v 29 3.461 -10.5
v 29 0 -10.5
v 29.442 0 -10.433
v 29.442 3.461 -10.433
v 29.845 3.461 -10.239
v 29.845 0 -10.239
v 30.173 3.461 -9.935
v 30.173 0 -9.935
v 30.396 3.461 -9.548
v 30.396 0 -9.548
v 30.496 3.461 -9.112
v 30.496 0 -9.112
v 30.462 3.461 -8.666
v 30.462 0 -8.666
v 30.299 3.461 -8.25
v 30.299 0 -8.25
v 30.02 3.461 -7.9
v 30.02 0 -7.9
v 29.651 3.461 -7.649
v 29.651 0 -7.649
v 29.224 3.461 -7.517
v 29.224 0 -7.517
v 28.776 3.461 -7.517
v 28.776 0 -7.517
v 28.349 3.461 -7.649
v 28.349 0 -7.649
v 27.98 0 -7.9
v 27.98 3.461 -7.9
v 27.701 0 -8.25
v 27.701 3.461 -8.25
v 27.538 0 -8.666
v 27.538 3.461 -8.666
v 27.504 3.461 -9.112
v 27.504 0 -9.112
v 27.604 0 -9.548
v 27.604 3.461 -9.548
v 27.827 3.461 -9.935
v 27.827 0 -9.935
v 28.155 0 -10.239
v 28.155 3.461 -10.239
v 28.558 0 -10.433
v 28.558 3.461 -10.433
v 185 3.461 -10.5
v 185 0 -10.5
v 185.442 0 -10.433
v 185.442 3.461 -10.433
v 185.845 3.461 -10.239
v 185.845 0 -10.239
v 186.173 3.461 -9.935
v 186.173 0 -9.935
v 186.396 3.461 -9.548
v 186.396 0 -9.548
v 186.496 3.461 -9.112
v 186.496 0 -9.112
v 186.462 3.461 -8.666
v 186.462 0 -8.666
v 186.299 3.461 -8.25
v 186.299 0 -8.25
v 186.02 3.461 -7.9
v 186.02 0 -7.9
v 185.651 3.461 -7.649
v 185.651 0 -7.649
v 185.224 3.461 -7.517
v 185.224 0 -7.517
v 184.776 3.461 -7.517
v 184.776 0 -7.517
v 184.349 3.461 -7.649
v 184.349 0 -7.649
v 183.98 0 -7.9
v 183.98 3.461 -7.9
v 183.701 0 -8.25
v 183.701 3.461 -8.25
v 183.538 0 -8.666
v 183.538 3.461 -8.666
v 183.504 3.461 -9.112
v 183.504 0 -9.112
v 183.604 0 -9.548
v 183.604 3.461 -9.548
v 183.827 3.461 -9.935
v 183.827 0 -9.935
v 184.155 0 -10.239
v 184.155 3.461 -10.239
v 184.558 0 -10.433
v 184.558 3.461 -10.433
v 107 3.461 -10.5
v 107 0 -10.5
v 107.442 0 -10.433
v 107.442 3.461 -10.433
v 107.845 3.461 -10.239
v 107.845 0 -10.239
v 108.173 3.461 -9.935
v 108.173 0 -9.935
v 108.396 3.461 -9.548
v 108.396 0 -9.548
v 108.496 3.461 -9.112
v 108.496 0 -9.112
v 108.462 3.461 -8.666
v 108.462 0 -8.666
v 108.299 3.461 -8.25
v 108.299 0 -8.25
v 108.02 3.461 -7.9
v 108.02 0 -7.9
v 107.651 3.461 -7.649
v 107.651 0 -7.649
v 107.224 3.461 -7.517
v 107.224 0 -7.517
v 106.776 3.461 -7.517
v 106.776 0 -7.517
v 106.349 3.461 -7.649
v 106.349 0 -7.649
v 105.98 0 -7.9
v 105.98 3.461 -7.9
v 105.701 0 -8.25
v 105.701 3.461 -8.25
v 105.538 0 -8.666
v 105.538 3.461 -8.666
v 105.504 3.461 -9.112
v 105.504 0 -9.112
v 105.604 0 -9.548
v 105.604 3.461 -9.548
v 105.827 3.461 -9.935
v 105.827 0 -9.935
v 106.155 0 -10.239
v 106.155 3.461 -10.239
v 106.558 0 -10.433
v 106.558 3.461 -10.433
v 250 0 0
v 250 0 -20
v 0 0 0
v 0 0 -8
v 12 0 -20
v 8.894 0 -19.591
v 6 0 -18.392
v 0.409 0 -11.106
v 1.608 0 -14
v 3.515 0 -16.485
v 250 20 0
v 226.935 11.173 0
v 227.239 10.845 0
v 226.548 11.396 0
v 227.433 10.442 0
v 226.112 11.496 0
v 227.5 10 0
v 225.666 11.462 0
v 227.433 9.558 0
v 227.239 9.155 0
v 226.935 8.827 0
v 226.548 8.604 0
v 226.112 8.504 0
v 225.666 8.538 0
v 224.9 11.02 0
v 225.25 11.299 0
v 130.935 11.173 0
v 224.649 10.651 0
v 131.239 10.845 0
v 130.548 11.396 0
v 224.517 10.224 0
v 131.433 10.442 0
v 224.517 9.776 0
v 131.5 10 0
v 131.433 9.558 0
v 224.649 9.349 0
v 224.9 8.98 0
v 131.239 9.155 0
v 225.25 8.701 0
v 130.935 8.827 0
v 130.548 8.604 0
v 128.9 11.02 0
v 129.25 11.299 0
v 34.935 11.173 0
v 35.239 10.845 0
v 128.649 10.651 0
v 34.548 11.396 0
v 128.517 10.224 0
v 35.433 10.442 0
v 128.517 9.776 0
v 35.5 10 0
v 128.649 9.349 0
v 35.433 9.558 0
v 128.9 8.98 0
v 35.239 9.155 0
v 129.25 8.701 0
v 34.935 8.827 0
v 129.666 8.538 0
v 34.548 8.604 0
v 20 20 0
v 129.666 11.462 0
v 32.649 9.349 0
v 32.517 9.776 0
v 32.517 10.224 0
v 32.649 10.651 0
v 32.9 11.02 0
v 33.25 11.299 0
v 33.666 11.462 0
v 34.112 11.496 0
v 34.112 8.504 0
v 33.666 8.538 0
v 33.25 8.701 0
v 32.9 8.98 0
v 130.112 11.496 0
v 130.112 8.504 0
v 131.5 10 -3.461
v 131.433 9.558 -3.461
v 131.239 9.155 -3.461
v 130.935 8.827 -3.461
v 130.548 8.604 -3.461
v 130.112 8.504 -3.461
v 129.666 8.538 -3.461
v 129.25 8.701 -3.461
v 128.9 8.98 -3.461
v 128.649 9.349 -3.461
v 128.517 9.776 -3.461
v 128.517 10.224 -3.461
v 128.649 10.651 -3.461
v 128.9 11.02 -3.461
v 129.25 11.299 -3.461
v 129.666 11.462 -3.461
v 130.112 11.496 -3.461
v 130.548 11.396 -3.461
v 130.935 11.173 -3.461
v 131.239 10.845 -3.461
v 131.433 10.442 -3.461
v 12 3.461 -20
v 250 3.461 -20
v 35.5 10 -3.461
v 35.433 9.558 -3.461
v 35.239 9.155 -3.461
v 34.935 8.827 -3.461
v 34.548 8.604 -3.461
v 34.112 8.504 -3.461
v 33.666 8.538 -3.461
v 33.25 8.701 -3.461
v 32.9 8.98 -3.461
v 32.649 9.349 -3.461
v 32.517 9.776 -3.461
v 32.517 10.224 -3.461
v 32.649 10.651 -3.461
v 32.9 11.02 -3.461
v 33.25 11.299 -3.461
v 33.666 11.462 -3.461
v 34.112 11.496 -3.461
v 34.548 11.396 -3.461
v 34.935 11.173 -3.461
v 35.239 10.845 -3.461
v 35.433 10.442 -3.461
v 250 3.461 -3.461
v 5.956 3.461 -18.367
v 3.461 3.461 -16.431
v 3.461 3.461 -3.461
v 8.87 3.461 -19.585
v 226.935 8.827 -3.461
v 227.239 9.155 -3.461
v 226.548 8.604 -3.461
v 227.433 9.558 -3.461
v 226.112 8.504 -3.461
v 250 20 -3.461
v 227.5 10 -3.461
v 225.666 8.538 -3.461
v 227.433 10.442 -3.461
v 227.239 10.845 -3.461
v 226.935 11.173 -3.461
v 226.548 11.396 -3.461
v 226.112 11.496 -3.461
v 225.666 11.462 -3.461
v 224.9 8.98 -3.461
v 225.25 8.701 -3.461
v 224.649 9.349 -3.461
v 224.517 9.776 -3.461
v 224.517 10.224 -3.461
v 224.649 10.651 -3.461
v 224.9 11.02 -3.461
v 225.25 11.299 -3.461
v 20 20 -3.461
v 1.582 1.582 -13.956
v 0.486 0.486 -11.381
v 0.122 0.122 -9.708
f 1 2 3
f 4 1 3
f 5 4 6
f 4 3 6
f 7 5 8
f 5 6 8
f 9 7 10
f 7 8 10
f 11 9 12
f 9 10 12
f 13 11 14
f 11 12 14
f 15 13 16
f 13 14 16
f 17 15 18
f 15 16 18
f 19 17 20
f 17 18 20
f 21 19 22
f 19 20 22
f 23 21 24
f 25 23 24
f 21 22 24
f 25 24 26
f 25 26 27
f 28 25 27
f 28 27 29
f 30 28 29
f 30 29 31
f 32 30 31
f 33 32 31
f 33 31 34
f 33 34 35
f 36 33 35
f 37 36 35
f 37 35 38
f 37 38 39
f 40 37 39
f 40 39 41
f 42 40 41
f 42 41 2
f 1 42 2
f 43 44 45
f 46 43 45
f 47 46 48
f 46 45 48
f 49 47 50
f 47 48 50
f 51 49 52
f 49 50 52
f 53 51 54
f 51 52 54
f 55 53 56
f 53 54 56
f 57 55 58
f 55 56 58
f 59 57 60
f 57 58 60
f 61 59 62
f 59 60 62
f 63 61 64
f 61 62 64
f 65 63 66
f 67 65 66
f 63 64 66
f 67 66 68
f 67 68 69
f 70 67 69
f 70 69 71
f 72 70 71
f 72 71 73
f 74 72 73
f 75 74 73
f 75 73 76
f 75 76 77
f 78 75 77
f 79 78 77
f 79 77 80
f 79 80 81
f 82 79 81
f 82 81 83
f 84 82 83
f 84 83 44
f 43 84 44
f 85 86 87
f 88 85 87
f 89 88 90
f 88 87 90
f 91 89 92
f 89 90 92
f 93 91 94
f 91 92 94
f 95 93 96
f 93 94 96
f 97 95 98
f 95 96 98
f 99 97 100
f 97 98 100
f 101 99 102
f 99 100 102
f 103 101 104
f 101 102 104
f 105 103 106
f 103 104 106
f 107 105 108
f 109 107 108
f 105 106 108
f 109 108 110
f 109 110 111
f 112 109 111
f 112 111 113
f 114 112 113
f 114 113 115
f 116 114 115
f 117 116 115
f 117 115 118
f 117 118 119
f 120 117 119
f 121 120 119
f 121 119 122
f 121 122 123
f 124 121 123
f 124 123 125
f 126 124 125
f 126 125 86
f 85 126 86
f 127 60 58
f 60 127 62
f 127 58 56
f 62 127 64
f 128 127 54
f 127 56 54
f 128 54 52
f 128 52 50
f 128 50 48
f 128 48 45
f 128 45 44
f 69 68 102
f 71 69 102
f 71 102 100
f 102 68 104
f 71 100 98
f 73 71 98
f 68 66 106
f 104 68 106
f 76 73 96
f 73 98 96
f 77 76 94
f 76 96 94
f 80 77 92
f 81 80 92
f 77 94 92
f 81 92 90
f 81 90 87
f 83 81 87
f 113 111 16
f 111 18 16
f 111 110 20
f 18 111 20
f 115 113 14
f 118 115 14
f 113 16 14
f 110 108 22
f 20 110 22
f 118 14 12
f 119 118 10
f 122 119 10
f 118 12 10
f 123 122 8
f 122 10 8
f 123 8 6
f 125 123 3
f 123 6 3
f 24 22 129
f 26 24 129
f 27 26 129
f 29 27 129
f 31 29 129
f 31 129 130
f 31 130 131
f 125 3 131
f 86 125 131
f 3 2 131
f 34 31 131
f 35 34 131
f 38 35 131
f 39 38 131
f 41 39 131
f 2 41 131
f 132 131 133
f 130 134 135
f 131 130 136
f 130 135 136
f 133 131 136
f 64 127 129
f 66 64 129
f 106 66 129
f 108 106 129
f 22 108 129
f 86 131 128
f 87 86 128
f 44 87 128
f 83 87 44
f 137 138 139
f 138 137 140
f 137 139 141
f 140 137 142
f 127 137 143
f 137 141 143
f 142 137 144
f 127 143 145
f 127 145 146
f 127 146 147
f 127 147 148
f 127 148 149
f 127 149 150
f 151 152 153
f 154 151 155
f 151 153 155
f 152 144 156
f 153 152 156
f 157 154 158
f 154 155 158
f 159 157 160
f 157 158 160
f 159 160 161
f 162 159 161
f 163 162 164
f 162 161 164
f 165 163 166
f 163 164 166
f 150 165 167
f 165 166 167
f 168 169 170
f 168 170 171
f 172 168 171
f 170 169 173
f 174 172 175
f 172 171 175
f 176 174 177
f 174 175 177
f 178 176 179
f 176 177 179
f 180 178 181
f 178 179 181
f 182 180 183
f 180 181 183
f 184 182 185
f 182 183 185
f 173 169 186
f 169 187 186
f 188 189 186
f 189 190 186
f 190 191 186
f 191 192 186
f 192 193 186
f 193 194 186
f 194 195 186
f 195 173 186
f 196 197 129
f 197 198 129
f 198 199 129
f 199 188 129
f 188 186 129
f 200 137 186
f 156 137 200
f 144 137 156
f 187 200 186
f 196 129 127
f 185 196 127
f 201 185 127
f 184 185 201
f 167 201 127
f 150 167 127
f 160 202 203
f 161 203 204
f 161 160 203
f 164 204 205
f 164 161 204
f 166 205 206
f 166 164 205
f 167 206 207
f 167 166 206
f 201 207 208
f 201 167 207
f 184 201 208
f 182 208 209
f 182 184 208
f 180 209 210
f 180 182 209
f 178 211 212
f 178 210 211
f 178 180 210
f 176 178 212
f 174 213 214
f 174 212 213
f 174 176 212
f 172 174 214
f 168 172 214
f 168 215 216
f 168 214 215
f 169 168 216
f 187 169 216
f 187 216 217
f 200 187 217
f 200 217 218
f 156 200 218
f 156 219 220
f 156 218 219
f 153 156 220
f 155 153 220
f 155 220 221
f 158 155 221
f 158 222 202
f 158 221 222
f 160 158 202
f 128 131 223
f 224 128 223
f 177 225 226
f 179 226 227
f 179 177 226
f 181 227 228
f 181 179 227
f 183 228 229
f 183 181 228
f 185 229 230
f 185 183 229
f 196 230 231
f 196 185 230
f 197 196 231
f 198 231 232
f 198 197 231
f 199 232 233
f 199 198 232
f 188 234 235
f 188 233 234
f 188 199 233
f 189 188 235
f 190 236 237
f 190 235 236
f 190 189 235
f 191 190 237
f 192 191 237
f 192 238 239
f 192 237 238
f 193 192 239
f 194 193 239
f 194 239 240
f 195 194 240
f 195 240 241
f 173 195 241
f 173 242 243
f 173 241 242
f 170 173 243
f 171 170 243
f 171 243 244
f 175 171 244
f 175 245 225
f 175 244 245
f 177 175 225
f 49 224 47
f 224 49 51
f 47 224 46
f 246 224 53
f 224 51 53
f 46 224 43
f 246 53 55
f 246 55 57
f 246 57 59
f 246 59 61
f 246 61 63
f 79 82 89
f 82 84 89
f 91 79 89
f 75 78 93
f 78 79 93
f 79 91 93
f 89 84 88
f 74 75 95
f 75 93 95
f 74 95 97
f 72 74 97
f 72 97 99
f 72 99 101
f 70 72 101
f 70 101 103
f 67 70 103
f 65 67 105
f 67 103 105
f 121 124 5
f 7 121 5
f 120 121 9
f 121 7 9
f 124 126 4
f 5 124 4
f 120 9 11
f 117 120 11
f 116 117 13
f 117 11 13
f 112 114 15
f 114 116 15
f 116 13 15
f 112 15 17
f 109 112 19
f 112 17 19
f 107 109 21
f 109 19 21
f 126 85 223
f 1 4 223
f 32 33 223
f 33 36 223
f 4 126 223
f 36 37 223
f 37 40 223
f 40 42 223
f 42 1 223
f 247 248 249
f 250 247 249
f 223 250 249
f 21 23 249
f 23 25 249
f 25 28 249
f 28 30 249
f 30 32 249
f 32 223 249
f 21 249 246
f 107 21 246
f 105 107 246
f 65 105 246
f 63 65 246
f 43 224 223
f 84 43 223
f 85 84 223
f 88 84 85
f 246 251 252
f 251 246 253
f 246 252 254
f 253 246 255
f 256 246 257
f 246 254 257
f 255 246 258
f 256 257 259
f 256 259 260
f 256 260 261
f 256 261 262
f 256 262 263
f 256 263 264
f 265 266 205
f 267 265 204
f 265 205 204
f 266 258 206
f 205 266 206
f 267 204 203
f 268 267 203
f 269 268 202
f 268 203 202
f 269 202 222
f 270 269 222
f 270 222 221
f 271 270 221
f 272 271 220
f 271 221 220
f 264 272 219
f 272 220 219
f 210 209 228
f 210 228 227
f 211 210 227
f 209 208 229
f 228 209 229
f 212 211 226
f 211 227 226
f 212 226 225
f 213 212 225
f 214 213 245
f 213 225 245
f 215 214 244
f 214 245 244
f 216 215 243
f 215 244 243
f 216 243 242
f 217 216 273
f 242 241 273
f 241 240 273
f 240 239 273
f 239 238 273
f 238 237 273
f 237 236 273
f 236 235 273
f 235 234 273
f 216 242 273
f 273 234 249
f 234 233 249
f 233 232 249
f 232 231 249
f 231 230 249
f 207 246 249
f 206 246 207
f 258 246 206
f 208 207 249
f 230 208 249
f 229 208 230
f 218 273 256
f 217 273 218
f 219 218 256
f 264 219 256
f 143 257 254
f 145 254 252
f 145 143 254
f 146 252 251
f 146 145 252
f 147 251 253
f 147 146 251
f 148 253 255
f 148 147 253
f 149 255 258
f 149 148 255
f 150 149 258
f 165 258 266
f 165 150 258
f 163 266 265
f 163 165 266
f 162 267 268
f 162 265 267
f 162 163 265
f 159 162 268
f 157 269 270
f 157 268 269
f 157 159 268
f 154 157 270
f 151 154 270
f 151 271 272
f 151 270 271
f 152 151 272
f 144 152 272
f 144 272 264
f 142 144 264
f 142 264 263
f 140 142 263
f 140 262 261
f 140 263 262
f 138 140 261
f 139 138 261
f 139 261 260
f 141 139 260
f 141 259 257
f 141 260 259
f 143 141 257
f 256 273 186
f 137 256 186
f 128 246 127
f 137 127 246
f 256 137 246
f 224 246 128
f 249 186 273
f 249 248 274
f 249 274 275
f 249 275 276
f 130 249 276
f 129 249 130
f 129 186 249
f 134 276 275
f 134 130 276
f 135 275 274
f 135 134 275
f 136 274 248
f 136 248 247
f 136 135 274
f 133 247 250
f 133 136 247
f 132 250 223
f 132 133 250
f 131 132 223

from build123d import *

# Parameters (mm, degrees)
BOSS_EXTRUDE1_DEPTH = 250
SKETCH2_R           = 1.5
CUT_EXTRUDE1_DEPTH  = 252.594912508
SKETCH3_R           = 1.5
CUT_EXTRUDE2_DEPTH  = 252.594912508


with BuildPart() as part:
    # Sketch1 → Boss-Extrude1 (new body)
    with BuildSketch(Plane(origin=(0, 0, 0), x_dir=(0, 0, -1), z_dir=(1, 0, 0))):
        Polygon((0, 0), (20, 0), (20, 3.461178467), (3.461178467, 3.461178467), (3.461178467, 20), (0, 20), align=None)
    extrude(amount=BOSS_EXTRUDE1_DEPTH)

    # Sketch2 → Cut-Extrude1 (cut, through all)
    with BuildSketch(Plane(origin=(0, 0, 0), x_dir=(1, 0, 0), z_dir=(0, 0, -1))):
        with Locations((130, -10)):
            Circle(SKETCH2_R)
        with Locations((34, -10)):
            Circle(SKETCH2_R)
        with Locations((226, -10)):
            Circle(SKETCH2_R)
        Polygon((0, 0), (0, -20), (20, -20), align=None)
    extrude(amount=CUT_EXTRUDE1_DEPTH, mode=Mode.SUBTRACT)

    # Sketch3 → Cut-Extrude2 (cut, through all)
    with BuildSketch(Plane.XZ):
        with Locations(Location((185, -9, 0), (0, 0, 270))):
            Circle(SKETCH3_R)
        with Locations(Location((107, -9, 0), (0, 0, 270))):
            Circle(SKETCH3_R)
        with Locations(Location((29, -9, 0), (0, 0, 270))):
            Circle(SKETCH3_R)
        with BuildLine():
            Line((12, -20), (0, -20))
            Line((0, -20), (0, -8))
            ThreePointArc((0, -8), (3.514718626, -16.485281374), (12, -20))
        make_face()
    extrude(amount=-CUT_EXTRUDE2_DEPTH, mode=Mode.SUBTRACT)


solid = part.part
